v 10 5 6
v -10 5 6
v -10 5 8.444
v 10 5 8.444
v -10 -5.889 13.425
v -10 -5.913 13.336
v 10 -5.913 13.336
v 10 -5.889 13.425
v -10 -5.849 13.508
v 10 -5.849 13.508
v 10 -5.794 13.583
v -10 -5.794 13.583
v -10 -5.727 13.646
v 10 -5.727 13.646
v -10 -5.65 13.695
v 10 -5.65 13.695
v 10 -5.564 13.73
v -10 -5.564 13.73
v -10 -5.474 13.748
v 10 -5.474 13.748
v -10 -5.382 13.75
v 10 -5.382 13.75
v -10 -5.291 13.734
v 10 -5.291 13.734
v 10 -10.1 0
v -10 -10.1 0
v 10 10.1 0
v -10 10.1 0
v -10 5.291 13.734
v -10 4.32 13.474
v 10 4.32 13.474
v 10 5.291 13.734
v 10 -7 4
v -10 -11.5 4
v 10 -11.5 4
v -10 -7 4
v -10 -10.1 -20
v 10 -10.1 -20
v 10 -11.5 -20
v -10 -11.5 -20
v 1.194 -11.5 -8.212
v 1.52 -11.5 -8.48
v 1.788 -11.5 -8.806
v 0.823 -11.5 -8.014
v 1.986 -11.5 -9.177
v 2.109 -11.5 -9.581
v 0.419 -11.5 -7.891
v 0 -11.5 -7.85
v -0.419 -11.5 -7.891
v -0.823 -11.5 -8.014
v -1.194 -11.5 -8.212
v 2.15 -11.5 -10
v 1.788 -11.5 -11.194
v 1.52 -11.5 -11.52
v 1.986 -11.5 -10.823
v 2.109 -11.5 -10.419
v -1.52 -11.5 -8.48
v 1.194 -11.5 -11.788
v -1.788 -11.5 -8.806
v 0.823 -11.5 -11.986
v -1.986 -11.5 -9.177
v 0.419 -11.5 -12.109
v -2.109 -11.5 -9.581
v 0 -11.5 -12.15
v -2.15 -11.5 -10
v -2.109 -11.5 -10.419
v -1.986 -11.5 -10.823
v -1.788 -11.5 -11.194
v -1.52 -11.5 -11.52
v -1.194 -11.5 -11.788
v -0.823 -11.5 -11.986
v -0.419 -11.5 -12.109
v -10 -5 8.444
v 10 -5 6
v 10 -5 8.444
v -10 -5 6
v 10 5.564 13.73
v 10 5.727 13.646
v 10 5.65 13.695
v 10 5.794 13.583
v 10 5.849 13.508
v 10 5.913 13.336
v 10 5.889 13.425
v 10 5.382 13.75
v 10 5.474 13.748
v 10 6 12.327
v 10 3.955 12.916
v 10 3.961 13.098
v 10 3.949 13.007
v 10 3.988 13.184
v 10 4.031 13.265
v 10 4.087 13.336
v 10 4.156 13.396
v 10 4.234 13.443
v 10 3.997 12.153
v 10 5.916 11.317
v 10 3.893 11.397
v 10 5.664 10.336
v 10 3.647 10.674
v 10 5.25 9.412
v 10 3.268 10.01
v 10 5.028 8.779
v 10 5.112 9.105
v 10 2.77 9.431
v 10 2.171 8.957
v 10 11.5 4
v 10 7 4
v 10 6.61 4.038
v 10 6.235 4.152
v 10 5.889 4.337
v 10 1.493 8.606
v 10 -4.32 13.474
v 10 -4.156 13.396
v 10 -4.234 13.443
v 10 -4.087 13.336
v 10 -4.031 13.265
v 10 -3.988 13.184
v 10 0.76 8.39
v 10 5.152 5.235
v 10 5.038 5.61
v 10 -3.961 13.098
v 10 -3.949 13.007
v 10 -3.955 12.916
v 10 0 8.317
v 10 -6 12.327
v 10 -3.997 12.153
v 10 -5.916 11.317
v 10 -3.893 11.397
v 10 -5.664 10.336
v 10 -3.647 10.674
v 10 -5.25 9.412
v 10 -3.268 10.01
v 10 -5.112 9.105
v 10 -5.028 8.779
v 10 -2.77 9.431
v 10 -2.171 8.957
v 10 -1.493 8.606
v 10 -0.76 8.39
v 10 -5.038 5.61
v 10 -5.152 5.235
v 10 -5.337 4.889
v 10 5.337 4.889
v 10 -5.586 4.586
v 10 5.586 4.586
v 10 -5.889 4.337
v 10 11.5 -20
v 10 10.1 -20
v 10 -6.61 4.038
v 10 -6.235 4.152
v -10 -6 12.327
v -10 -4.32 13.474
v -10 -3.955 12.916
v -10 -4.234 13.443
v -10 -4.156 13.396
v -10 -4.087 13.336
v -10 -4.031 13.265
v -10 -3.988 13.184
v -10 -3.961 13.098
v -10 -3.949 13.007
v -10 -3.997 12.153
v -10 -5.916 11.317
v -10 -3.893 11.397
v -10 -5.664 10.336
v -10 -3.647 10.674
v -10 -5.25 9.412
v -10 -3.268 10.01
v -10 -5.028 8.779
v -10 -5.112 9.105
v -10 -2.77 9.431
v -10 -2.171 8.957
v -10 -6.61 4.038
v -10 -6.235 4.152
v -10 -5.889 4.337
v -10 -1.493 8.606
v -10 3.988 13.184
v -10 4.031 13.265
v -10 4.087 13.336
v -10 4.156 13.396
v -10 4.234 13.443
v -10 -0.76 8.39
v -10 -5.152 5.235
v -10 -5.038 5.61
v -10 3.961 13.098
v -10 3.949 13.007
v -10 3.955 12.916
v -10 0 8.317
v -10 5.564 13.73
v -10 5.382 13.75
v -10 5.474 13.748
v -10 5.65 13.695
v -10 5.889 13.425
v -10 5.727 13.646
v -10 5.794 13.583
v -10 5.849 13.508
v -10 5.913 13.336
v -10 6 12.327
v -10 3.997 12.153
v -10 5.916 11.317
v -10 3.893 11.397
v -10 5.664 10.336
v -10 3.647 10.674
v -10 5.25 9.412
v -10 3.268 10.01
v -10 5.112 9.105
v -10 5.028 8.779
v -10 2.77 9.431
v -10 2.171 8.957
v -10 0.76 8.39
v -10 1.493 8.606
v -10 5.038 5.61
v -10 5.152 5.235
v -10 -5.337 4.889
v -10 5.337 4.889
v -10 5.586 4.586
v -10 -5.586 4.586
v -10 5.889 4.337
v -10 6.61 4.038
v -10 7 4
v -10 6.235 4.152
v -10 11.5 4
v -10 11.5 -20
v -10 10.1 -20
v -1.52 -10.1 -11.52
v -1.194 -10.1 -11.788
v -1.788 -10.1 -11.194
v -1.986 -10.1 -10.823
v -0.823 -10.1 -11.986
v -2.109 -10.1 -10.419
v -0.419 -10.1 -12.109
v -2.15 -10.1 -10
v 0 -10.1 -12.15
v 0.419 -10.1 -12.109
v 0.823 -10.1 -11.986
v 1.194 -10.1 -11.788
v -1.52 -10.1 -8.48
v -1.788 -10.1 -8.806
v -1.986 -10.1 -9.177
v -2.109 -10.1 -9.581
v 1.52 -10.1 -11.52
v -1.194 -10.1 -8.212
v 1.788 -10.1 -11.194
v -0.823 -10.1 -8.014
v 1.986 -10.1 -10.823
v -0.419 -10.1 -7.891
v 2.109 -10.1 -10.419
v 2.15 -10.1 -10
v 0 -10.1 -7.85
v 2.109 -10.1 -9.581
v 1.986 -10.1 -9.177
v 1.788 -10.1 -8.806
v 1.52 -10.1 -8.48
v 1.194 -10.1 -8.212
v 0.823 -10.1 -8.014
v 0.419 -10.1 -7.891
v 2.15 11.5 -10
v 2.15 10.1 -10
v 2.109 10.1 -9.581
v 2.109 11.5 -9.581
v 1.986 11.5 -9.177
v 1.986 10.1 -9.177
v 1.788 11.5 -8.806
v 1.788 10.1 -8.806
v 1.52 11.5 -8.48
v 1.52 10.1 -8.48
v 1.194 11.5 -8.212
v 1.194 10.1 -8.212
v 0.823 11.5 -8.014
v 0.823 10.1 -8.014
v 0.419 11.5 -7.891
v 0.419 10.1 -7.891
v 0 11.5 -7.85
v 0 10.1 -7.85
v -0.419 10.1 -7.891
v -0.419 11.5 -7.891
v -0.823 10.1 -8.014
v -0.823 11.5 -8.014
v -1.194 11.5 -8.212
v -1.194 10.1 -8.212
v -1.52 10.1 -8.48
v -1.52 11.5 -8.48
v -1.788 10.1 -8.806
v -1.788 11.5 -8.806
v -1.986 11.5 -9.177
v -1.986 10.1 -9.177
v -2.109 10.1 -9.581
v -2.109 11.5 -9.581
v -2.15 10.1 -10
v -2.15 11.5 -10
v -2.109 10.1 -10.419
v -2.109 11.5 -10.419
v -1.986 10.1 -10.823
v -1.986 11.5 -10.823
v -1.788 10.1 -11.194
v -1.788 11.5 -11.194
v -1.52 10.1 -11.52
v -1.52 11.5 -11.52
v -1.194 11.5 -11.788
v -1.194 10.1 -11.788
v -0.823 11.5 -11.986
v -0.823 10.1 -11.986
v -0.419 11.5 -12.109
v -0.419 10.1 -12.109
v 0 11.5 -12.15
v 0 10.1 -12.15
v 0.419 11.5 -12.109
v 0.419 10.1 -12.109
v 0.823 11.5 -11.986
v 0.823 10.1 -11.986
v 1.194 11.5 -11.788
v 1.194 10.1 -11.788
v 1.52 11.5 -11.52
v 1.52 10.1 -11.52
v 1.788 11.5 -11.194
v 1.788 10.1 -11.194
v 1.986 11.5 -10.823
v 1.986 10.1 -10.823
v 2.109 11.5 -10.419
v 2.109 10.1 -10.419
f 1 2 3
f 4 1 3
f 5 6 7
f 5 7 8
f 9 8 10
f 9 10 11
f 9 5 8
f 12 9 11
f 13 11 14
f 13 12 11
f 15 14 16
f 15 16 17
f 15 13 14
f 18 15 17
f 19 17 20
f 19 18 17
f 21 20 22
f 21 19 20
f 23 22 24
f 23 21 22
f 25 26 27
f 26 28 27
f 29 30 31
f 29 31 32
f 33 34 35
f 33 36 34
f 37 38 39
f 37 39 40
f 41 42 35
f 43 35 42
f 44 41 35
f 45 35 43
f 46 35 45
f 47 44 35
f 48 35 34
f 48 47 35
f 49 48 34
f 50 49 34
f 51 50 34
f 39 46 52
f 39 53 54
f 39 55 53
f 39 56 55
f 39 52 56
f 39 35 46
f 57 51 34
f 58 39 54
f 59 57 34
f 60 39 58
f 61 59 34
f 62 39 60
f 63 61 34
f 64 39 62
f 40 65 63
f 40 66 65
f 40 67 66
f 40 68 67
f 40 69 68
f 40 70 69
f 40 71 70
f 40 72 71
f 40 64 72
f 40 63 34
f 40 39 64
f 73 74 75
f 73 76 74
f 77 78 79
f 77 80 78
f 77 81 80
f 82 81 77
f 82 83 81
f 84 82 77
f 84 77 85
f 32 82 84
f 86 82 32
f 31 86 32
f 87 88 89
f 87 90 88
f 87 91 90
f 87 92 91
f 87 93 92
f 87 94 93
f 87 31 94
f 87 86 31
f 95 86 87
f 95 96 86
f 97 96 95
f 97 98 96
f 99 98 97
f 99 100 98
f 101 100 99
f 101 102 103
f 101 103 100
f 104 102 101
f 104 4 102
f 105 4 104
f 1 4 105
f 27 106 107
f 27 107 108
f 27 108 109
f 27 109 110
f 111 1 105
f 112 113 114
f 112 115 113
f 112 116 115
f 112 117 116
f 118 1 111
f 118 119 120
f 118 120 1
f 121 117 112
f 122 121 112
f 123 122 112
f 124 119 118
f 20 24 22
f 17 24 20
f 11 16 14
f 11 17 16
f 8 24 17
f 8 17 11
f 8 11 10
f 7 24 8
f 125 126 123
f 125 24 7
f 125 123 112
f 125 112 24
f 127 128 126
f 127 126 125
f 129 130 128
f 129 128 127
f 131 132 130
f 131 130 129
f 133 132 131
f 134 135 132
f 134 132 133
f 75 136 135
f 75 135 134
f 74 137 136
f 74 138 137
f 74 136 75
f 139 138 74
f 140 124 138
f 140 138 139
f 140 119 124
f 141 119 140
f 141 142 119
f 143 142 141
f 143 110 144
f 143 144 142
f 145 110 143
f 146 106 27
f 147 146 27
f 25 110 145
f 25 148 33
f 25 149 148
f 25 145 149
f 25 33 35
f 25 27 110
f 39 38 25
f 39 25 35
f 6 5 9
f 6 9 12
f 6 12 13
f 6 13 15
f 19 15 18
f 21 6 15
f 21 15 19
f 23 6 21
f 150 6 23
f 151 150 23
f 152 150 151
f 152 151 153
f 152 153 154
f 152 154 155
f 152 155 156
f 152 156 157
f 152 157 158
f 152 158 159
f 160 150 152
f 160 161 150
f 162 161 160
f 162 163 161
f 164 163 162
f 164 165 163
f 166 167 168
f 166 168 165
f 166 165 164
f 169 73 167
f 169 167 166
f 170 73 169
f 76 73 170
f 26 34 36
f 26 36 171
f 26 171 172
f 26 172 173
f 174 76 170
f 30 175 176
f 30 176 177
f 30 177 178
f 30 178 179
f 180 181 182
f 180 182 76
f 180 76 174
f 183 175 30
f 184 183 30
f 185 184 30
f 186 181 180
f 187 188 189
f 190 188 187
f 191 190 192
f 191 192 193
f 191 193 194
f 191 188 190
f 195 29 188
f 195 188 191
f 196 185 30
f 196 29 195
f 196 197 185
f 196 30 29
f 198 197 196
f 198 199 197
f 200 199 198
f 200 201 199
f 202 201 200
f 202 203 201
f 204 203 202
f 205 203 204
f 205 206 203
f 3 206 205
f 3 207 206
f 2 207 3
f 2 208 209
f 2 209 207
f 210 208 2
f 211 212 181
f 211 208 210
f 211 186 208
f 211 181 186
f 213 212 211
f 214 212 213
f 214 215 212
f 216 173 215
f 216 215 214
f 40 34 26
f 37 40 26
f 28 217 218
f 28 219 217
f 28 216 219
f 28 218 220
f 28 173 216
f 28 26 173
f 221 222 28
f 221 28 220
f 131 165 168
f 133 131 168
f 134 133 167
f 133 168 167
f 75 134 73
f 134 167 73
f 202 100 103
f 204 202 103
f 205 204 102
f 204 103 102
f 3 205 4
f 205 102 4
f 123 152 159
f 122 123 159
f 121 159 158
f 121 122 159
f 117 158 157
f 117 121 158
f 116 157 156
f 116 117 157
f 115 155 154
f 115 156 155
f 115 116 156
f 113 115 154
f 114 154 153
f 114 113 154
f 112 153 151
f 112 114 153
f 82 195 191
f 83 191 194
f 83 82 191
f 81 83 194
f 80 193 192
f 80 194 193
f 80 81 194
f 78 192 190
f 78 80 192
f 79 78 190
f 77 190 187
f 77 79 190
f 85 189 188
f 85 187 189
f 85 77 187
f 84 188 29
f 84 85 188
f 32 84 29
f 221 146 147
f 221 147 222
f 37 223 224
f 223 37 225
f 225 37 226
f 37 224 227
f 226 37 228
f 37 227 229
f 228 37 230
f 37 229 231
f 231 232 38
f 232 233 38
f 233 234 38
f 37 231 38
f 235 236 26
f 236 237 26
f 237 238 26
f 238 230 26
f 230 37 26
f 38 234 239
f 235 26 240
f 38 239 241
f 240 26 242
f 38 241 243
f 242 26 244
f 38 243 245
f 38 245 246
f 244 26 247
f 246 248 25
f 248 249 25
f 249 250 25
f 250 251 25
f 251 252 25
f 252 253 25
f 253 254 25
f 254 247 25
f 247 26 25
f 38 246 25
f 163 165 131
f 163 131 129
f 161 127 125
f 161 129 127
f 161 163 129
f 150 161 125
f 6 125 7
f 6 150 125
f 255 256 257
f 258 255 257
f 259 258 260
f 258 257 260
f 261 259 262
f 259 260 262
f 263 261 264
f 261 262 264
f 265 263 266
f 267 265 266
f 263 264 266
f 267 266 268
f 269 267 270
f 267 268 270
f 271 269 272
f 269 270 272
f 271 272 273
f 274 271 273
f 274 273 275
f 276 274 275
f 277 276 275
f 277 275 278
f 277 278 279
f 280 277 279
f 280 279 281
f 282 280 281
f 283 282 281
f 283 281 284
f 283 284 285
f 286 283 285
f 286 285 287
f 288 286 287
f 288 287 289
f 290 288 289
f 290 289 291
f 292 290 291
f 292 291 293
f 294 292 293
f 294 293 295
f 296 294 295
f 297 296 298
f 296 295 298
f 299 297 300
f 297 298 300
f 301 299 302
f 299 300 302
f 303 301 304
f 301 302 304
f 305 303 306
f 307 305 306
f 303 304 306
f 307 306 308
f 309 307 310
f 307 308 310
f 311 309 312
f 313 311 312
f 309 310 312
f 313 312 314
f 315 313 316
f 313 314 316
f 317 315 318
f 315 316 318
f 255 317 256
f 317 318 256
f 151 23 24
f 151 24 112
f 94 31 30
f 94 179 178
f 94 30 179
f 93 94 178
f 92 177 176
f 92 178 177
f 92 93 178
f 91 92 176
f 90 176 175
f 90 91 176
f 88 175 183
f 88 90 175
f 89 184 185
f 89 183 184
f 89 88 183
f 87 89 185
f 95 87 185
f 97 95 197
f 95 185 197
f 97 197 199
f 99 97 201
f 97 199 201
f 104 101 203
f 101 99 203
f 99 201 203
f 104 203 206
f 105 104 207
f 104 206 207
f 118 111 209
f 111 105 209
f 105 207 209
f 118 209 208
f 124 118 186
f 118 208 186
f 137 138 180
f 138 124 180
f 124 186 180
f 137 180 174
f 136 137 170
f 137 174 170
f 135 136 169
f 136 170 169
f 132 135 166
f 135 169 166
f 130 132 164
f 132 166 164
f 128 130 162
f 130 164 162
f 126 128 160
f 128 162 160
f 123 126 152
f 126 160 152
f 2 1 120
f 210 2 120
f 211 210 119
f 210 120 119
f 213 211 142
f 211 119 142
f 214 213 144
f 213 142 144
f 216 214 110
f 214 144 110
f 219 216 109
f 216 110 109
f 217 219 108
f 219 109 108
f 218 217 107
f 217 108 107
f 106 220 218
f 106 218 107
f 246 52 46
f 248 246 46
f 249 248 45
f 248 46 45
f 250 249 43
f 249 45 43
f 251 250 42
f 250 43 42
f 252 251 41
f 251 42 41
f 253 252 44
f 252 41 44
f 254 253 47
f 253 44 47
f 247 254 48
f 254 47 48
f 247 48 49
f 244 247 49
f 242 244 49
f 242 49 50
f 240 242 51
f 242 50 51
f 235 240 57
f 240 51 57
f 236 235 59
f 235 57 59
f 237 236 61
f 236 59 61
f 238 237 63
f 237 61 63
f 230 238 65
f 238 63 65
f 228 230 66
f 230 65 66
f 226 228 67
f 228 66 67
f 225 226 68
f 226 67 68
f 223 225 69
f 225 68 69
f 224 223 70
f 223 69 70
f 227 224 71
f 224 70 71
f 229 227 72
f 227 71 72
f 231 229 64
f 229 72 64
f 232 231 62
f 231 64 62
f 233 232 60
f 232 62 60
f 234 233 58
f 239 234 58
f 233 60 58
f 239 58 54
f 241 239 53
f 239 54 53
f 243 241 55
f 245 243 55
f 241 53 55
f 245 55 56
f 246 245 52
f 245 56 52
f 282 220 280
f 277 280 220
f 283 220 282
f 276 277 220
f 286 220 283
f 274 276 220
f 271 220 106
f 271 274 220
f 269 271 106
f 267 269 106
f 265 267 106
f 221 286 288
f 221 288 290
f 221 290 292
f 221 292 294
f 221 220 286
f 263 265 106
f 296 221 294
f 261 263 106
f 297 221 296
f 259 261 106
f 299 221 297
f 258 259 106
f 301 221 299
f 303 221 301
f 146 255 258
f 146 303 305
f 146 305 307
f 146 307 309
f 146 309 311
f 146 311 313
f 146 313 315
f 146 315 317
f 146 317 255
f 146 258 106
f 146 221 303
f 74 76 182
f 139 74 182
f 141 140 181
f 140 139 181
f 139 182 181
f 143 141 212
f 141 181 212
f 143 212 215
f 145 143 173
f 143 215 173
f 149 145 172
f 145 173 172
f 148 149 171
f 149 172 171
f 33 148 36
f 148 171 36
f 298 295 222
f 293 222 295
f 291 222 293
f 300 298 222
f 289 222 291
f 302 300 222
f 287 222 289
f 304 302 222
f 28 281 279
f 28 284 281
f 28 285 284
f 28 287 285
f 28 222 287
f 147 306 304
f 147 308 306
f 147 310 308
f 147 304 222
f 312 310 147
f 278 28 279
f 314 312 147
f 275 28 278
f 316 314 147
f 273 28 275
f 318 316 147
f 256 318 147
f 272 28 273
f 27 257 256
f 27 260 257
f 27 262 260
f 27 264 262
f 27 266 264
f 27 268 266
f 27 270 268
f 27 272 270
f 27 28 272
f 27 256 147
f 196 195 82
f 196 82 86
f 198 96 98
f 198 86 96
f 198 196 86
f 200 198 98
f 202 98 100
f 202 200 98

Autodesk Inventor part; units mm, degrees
ref_plane "YZ Plane" through (0, 0, 0) normal (1, 0, 0) x (0, 1, 0)
ref_plane "XZ Plane" through (0, 0, 0) normal (0, 1, 0) x (-1, 0, 0)
ref_plane "XY Plane" through (0, 0, 0) normal (0, 0, 1) x (1, 0, 0)
sketch "Sketch1" plane through (0, 0, 0) normal (0, 0, 1) x (1, 0, 0)
  line L0 (-10, 11.5) -> (10, 11.5)
  line L1 (10, 11.5) -> (10, -11.5)
  line L2 (10, -11.5) -> (-10, -11.5)
  line L3 (-10, -11.5) -> (-10, 11.5)
  point P0 (0, 0)
  point P1 (0, 11.5)
  point P2 (-10, 0)
  dimension "d0" = 20
  dimension "d16" = 23
extrude "Extrusion1" add sketch "Sketch1" along normal blind 4
sketch "Sketch2" plane through (0, 0, 0) normal (1, 0, 0) x (0, 1, 0)
  line L0 (11.5, 0) -> (-11.5, 0) projected
  line L1 (-11.5, 0) -> (-11.5, 4) projected
  line L2 (11.5, 4) -> (-11.5, 4) projected
  line L3 (11.5, 0) -> (11.5, 4) projected
  line L4 (5, 4) -> (5, 9)
  line L5 (-5, 4) -> (-5, 9)
  arc A0 (-5.7956, 13.8695) -> (5.7956, 13.8695) centre (0, 12.3166) ccw
  arc A1 (-3.8637, 13.3519) -> (3.8637, 13.3519) centre (0, 12.3166) ccw
  line L6 (3.8637, 13.3519) -> (5.7956, 13.8695)
  line L7 (-5.7956, 13.8695) -> (-3.8637, 13.3519)
  point P0 (0, 0)
  point P1 (0, 0)
  dimension "d3" = 6
  dimension "d4" = 5
  dimension "d5" = 4
  dimension "d6" = 10
  dimension "d8" = 150
extrude "Extrusion2" add sketch "Sketch2" along normal mid plane 20 contours L2 L5 A0 L4 | A0 L7 A1 L6
fillet "Fillet1" radius 2 4 edges at (0, -5, 4) (0, -5, 9) (0, 5, 9) (0, 5, 4)
fillet "Fillet2" radius 0.5 4 edges at (0, 3.8637, 13.3519) (0, 5.7956, 13.8695) (0, -3.8637, 13.3519) (0, -5.7956, 13.8695)
sketch "Sketch4" plane through (0, 0, 0) normal (0, 0, -1) x (-1, 0, 0)
  line L0 (-10, -11.5) -> (-10, 11.5) projected
  line L1 (10, 11.5) -> (10, -11.5) projected
  line L2 (-10, 11.5) -> (10, 11.5)
  line L3 (10, 11.5) -> (10, 10.1)
  line L4 (10, 10.1) -> (-10, 10.1)
  line L5 (-10, 10.1) -> (-10, 11.5)
  line L6 (10, -11.5) -> (-10, -11.5) projected
  line L7 (-10, -11.5) -> (10, -11.5)
  line L8 (10, -11.5) -> (10, -10.1)
  line L9 (10, -10.1) -> (-10, -10.1)
  line L10 (-10, -10.1) -> (-10, -11.5)
  point P0 (0, 0)
  point P1 (-10, -10.1)
  point P2 (-10, 10.1)
  dimension "d17" = 1.4
extrude "Extrusion3" add sketch "Sketch4" along normal blind 20 contours L0 L9 L1 L6 | L0 L2 L1 L4
sketch "Sketch5" plane through (-10, -11.5, 4) normal (0, -1, 0) x (1, 0, 0)
  line L0 (0, -4) -> (20, -4) projected
  line L1 (0, -4) -> (0, -24) projected
  line L2 (20, -24) -> (0, -24) projected
  line L3 (20, -4) -> (20, -24) projected
  circle A0 centre (10, -14) radius 2.15
  point P0 (10, -4)
  point P1 (0, -14)
  dimension "d20" = 4.3
extrude "Extrusion4" cut sketch "Sketch5" against normal through all contours A0
properties part number "Stengelihalter"
